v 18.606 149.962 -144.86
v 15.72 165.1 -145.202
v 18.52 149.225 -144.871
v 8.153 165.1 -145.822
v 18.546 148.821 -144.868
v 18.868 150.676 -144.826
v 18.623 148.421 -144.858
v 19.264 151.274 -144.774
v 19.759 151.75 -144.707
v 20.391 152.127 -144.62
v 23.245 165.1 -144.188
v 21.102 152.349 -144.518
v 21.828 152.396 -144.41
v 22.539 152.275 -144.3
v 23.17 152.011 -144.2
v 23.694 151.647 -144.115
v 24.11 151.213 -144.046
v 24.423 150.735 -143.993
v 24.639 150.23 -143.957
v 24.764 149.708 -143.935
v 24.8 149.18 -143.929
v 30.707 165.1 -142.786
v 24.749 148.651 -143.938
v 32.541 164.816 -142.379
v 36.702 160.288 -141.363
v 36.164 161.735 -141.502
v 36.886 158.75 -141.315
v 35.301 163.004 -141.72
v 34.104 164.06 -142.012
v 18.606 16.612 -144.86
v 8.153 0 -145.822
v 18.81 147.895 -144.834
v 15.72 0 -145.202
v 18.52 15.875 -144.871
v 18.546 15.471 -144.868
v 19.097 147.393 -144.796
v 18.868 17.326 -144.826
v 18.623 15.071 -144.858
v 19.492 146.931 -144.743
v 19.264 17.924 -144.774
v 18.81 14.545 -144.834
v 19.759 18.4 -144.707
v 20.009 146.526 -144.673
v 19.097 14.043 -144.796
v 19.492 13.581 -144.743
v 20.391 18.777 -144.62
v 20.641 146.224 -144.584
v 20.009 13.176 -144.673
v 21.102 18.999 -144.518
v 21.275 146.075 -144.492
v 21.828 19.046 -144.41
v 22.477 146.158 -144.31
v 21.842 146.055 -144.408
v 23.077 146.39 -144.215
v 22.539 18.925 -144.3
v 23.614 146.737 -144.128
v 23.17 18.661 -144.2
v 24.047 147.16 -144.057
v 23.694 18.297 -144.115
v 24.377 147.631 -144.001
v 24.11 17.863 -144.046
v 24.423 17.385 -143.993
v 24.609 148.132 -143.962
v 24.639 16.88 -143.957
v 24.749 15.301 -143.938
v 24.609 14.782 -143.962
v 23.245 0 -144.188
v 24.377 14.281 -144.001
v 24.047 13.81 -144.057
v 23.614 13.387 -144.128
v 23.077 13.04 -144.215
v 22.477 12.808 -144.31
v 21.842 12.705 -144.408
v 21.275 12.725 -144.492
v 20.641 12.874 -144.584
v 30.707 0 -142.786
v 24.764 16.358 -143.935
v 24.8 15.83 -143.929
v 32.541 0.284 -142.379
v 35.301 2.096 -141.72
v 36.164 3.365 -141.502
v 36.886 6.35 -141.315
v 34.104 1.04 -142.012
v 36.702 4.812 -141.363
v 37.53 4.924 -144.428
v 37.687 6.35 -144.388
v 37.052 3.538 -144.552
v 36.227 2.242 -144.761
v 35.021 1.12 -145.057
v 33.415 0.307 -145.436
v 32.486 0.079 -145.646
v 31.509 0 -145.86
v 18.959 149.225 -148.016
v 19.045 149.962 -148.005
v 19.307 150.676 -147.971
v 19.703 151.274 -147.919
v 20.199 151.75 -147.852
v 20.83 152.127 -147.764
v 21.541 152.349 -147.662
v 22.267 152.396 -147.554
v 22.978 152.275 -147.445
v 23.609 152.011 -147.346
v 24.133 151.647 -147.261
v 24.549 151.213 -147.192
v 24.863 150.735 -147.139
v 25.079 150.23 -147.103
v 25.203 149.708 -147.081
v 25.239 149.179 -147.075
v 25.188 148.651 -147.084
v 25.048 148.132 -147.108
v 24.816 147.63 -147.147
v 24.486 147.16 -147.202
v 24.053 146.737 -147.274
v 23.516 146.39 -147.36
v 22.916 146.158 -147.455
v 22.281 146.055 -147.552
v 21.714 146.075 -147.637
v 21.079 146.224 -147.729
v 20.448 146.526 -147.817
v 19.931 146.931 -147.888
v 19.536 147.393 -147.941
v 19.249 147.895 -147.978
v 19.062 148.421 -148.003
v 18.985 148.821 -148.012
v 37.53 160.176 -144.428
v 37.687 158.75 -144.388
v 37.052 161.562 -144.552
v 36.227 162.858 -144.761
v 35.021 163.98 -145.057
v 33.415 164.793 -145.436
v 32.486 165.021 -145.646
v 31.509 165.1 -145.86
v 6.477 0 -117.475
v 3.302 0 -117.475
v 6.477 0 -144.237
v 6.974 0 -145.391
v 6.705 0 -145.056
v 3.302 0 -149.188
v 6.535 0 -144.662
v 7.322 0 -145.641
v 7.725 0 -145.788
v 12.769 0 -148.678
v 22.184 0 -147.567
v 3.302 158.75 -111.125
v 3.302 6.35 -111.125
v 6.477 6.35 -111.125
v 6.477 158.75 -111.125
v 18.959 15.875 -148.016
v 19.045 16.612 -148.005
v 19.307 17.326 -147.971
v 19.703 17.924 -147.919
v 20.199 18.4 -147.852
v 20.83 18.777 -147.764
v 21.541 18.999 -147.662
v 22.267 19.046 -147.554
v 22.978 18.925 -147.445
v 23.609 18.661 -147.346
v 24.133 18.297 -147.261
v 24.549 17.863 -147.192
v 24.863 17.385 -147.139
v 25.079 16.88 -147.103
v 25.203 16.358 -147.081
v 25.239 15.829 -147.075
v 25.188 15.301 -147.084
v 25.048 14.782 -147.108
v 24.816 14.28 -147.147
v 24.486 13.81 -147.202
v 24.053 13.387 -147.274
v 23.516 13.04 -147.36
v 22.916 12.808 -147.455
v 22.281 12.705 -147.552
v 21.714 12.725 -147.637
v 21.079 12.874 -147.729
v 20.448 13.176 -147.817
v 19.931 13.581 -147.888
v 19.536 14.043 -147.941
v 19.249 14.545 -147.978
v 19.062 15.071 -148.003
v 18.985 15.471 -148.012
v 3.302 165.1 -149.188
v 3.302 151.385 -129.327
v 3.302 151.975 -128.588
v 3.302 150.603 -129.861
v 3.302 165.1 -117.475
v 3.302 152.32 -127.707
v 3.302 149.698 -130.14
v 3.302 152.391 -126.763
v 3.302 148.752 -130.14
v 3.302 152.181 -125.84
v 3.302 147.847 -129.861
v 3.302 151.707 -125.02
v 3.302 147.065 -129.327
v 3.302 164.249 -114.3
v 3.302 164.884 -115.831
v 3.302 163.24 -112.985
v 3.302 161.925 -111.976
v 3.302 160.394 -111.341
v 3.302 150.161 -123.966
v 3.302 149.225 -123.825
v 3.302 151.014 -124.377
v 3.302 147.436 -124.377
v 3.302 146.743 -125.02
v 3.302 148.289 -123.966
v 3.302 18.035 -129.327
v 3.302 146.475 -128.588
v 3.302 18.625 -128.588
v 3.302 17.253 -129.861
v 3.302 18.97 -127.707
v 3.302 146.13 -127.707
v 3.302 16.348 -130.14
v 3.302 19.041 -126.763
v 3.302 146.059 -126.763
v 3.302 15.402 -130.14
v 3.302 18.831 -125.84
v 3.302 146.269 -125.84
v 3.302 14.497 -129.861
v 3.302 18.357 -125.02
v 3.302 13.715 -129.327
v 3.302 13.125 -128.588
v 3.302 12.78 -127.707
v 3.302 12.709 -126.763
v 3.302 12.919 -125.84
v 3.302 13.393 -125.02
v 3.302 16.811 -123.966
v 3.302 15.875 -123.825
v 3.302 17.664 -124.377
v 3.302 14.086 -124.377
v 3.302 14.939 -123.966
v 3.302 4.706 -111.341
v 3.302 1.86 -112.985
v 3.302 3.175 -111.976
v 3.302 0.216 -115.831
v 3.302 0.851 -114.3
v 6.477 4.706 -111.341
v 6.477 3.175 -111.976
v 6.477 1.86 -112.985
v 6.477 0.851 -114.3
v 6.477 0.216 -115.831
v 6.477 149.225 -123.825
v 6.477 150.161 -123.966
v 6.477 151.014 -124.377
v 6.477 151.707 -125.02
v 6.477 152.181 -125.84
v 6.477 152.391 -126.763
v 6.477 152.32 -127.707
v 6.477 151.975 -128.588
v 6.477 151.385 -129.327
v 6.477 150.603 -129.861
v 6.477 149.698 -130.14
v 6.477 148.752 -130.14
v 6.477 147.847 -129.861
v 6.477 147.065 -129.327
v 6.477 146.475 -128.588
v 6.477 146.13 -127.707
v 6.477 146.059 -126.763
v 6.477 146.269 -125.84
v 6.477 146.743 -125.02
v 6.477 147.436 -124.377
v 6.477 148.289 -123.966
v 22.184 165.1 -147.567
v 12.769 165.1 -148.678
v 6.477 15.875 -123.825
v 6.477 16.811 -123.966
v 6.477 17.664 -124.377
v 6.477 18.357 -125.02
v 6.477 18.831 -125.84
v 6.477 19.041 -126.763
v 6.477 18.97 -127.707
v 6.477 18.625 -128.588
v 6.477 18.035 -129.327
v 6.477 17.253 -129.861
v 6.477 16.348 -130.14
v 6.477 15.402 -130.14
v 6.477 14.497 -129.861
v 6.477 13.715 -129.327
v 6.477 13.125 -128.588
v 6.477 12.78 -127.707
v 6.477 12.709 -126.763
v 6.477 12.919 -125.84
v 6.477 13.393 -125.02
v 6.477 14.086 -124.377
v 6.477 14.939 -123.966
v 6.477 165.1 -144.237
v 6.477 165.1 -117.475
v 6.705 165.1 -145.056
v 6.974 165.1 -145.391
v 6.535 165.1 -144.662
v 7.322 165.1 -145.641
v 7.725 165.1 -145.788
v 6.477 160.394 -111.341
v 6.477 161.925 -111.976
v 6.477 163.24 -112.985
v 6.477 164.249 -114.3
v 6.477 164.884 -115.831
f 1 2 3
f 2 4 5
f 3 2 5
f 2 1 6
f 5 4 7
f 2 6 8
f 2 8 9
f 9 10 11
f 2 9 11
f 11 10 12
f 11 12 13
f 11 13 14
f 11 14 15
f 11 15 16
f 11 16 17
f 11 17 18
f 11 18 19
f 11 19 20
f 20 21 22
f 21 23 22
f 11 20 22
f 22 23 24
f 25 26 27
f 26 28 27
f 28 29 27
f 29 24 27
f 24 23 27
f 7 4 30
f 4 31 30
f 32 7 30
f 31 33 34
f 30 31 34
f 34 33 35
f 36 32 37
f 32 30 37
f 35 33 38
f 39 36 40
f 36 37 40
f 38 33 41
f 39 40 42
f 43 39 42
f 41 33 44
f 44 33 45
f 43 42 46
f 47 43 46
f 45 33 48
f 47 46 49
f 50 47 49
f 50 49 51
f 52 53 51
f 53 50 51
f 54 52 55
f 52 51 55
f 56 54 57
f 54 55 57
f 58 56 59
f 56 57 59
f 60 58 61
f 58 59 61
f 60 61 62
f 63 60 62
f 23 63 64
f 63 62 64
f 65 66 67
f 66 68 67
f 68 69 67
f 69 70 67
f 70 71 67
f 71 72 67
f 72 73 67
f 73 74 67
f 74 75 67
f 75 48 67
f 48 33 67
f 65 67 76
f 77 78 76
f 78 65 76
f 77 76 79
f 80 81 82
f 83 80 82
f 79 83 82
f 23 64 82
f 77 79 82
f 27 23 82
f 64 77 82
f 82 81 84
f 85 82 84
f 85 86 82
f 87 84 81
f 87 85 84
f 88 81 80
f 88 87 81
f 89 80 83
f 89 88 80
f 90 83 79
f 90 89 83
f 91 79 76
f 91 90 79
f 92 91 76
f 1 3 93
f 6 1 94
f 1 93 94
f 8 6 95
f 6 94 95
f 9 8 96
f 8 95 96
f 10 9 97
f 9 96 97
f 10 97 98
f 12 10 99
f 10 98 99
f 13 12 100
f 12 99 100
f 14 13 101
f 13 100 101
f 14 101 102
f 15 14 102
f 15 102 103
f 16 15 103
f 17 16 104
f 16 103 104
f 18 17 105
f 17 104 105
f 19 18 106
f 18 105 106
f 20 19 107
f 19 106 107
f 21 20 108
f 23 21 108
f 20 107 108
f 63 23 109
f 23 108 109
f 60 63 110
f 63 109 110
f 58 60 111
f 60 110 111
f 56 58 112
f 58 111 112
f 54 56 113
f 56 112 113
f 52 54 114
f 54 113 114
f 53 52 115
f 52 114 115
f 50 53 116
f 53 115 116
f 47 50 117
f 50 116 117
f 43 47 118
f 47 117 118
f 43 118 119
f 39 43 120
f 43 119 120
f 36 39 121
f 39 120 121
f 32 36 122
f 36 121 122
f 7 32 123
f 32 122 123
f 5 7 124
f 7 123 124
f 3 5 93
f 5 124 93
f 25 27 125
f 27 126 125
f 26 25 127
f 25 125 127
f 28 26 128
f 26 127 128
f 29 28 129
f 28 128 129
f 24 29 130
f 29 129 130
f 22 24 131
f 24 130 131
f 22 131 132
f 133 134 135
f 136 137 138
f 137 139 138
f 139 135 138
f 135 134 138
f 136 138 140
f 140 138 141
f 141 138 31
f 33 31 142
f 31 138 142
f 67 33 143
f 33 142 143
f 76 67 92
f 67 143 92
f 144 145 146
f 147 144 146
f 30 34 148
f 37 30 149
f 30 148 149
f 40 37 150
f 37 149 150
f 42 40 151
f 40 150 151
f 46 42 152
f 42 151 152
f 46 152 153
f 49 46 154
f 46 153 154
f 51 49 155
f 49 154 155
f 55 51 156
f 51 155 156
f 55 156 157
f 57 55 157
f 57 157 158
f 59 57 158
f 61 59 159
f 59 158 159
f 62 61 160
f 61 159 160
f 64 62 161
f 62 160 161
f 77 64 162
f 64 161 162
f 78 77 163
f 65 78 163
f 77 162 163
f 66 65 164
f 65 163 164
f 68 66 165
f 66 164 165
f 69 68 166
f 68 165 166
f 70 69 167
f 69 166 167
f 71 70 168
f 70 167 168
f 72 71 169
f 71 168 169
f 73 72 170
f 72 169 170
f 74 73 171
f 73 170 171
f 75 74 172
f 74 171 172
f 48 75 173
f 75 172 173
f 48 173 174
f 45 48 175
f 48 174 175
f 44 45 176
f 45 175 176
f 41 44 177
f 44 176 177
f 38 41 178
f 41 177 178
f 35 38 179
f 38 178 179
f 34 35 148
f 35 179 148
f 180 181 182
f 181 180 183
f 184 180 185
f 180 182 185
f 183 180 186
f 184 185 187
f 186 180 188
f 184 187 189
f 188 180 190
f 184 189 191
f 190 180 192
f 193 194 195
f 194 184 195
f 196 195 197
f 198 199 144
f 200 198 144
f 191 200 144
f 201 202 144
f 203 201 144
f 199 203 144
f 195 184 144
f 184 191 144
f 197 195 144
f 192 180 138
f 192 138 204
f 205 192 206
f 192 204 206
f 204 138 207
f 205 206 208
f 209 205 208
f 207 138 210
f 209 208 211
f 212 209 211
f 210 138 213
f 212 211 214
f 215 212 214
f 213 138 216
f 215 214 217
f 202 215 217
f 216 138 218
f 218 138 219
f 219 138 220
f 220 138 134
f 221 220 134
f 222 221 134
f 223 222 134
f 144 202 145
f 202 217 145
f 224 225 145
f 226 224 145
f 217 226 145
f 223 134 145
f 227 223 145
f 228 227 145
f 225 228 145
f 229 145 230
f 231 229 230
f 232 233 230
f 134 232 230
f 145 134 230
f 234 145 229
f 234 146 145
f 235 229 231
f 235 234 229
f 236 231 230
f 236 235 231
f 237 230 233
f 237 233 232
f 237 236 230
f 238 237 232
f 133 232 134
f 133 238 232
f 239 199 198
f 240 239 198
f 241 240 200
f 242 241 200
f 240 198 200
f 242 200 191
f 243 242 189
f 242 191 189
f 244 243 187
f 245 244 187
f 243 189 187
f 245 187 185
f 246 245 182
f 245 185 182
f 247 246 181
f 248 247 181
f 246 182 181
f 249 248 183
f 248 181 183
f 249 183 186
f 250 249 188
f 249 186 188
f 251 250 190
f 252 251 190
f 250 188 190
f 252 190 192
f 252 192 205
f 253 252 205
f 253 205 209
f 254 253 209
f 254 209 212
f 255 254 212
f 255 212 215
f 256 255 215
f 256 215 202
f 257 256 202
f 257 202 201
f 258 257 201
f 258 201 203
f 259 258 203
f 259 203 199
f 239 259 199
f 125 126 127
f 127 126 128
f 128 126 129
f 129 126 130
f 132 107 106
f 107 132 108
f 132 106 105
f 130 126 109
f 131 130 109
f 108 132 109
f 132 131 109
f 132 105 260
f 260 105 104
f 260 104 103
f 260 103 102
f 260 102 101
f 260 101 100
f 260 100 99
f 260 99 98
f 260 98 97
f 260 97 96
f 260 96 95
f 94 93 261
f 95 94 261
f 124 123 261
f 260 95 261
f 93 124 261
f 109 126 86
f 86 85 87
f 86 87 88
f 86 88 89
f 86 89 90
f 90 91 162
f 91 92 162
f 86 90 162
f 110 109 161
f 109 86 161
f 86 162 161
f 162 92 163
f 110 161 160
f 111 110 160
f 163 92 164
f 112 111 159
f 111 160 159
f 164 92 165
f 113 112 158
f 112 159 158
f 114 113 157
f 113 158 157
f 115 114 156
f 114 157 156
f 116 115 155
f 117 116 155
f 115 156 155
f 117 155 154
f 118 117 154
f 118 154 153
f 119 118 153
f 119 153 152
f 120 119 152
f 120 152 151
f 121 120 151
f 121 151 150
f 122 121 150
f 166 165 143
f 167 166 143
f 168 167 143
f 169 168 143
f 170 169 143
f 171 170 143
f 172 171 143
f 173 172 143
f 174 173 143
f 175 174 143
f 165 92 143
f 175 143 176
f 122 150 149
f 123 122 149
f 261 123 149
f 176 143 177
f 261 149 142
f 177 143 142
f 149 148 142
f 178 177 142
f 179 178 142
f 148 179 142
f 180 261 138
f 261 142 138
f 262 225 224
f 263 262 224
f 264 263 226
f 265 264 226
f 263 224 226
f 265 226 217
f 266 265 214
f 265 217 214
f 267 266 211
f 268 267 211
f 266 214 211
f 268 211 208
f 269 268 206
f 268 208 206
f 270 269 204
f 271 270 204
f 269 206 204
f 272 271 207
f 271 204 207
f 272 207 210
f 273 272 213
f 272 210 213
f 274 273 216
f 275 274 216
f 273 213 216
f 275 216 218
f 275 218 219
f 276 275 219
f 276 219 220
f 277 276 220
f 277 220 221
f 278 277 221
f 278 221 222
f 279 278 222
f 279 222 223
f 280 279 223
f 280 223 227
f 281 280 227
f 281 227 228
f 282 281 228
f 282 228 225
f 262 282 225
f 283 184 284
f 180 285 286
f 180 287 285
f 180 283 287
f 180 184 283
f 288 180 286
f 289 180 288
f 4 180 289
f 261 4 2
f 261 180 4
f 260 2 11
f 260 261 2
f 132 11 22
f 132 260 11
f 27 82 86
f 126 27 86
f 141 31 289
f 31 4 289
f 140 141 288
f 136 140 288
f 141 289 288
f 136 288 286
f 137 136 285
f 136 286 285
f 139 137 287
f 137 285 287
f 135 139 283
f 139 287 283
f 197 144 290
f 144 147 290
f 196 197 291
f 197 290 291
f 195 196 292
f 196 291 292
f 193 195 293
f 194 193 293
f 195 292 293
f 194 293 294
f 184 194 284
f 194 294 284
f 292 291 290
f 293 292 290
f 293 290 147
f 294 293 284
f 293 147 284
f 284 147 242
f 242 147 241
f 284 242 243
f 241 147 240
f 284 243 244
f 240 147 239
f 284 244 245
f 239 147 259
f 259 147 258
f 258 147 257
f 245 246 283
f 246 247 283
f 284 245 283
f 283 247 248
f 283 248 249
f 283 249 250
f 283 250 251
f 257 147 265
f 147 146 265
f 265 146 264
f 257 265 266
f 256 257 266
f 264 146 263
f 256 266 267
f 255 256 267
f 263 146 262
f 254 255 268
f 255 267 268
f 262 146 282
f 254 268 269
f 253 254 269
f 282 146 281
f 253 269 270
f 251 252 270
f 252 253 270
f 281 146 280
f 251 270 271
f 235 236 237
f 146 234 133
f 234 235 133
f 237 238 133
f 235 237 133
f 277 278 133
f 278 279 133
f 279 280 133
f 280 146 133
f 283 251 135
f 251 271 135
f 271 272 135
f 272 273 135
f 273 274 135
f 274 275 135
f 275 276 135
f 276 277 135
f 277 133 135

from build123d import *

# Parameters (mm, degrees)
BOSS_EXTRUDE1_DEPTH            = 165.1
FILLET1_R                      = 6.35
FILLET2_R                      = 1.5875
SKETCH2_R                      = 3.175
CUT_EXTRUDE1_DEPTH             = 35.385404243
CUT_EXTRUDE2_REACH             = 39.698
SKETCH3_R                      = 3.175
CUT_EXTRUDE2_DIRECTION_2_REACH = 6.755


with BuildPart() as part:
    # Sketch1 → Boss-Extrude1 (new body)
    with BuildSketch(Plane(origin=(0, 0, 0), x_dir=(1, 0, 0), z_dir=(0, 1, 0))):
        with BuildLine():
            ThreePointArc((6.477, 145.90630888), (21.802443449, 144.413489535), (36.88554448, 141.315459552))
            Line((36.88554448, 141.315459552), (37.687404143, 144.38753476))
            ThreePointArc((37.687404143, 144.38753476), (20.634801681, 147.791425951), (3.302, 149.188462761))
            Line((3.302, 149.188462761), (3.302, 146.012668272))
            ThreePointArc((3.302, 146.012668272), (4.889789191, 145.968121388), (6.477, 145.90630888))
        make_face()
        with BuildLine():
            Line((3.302, 146.012668272), (3.302, 111.125))
            Line((3.302, 111.125), (6.477, 111.125))
            Line((6.477, 111.125), (6.477, 145.90630888))
            ThreePointArc((6.477, 145.90630888), (4.889789191, 145.968121388), (3.302, 146.012668272))
        make_face()
    extrude(amount=BOSS_EXTRUDE1_DEPTH)

    # Fillet1
    fillet1_edges = [part.edges().sort_by_distance(p)[0] for p in [
        (37.286474311, 165.1, -142.851497156),
        (4.8895, 165.1, -111.125),
        (4.8895, 0, -111.125),
        (37.286474311, 0, -142.851497156),
    ]]
    fillet(fillet1_edges, radius=FILLET1_R)

    # Fillet2
    fillet2_edges = [part.edges().sort_by_distance(p)[0] for p in [
        (6.477, 82.55, -145.90630888),
    ]]
    fillet(fillet2_edges, radius=FILLET2_R)

    # Sketch2 → Cut-Extrude1 (cut, through all)
    with BuildSketch(Plane.ZY.offset(-3.302)):
        with Locations((-127, 15.875)):
            Circle(SKETCH2_R)
        with Locations((-127, 149.225)):
            Circle(SKETCH2_R)
    extrude(amount=-CUT_EXTRUDE1_DEPTH, mode=Mode.SUBTRACT)

    # Sketch3 → Cut-Extrude2 (cut, up to next)
    with BuildSketch(Plane(origin=(20.494702071, 0, -146.78799876), x_dir=(-0.990393205, 0, -0.13827979), z_dir=(0.13827979, 0, -0.990393205)), mode=Mode.PRIVATE) as cut_extrude2_sk1:
        with Locations((-1.484470958, 15.875)):
            Circle(SKETCH3_R)
    cut_extrude2_tool1 = extrude(cut_extrude2_sk1.sketch, amount=-CUT_EXTRUDE2_REACH, mode=Mode.PRIVATE) & part.part
    add(cut_extrude2_tool1.solids().sort_by_distance((21.964912, 15.875, -146.582726))[0], mode=Mode.SUBTRACT)
    # Sketch3 → Cut-Extrude2 (cut, up to next)
    with BuildSketch(Plane(origin=(20.494702071, 0, -146.78799876), x_dir=(-0.990393205, 0, -0.13827979), z_dir=(0.13827979, 0, -0.990393205)), mode=Mode.PRIVATE) as cut_extrude2_sk2:
        with Locations((-1.484470958, 149.225)):
            Circle(SKETCH3_R)
    cut_extrude2_tool2 = extrude(cut_extrude2_sk2.sketch, amount=-CUT_EXTRUDE2_REACH, mode=Mode.PRIVATE) & part.part
    add(cut_extrude2_tool2.solids().sort_by_distance((21.964912, 149.225, -146.582726))[0], mode=Mode.SUBTRACT)

    # Sketch3 → Cut-Extrude2 direction 2 (cut, up to next)
    with BuildSketch(Plane(origin=(20.494702071, 0, -146.78799876), x_dir=(-0.990393205, 0, -0.13827979), z_dir=(0.13827979, 0, -0.990393205)), mode=Mode.PRIVATE) as cut_extrude2_direction_2_sk1:
        with Locations((-1.484470958, 15.875)):
            Circle(SKETCH3_R)
    cut_extrude2_direction_2_tool1 = extrude(cut_extrude2_direction_2_sk1.sketch, amount=CUT_EXTRUDE2_DIRECTION_2_REACH, mode=Mode.PRIVATE) & part.part
    add(cut_extrude2_direction_2_tool1.solids().sort_by_distance((21.964912, 15.875, -146.582726))[0], mode=Mode.SUBTRACT)
    # Sketch3 → Cut-Extrude2 direction 2 (cut, up to next)
    with BuildSketch(Plane(origin=(20.494702071, 0, -146.78799876), x_dir=(-0.990393205, 0, -0.13827979), z_dir=(0.13827979, 0, -0.990393205)), mode=Mode.PRIVATE) as cut_extrude2_direction_2_sk2:
        with Locations((-1.484470958, 149.225)):
            Circle(SKETCH3_R)
    cut_extrude2_direction_2_tool2 = extrude(cut_extrude2_direction_2_sk2.sketch, amount=CUT_EXTRUDE2_DIRECTION_2_REACH, mode=Mode.PRIVATE) & part.part
    add(cut_extrude2_direction_2_tool2.solids().sort_by_distance((21.964912, 149.225, -146.582726))[0], mode=Mode.SUBTRACT)


solid = part.part
